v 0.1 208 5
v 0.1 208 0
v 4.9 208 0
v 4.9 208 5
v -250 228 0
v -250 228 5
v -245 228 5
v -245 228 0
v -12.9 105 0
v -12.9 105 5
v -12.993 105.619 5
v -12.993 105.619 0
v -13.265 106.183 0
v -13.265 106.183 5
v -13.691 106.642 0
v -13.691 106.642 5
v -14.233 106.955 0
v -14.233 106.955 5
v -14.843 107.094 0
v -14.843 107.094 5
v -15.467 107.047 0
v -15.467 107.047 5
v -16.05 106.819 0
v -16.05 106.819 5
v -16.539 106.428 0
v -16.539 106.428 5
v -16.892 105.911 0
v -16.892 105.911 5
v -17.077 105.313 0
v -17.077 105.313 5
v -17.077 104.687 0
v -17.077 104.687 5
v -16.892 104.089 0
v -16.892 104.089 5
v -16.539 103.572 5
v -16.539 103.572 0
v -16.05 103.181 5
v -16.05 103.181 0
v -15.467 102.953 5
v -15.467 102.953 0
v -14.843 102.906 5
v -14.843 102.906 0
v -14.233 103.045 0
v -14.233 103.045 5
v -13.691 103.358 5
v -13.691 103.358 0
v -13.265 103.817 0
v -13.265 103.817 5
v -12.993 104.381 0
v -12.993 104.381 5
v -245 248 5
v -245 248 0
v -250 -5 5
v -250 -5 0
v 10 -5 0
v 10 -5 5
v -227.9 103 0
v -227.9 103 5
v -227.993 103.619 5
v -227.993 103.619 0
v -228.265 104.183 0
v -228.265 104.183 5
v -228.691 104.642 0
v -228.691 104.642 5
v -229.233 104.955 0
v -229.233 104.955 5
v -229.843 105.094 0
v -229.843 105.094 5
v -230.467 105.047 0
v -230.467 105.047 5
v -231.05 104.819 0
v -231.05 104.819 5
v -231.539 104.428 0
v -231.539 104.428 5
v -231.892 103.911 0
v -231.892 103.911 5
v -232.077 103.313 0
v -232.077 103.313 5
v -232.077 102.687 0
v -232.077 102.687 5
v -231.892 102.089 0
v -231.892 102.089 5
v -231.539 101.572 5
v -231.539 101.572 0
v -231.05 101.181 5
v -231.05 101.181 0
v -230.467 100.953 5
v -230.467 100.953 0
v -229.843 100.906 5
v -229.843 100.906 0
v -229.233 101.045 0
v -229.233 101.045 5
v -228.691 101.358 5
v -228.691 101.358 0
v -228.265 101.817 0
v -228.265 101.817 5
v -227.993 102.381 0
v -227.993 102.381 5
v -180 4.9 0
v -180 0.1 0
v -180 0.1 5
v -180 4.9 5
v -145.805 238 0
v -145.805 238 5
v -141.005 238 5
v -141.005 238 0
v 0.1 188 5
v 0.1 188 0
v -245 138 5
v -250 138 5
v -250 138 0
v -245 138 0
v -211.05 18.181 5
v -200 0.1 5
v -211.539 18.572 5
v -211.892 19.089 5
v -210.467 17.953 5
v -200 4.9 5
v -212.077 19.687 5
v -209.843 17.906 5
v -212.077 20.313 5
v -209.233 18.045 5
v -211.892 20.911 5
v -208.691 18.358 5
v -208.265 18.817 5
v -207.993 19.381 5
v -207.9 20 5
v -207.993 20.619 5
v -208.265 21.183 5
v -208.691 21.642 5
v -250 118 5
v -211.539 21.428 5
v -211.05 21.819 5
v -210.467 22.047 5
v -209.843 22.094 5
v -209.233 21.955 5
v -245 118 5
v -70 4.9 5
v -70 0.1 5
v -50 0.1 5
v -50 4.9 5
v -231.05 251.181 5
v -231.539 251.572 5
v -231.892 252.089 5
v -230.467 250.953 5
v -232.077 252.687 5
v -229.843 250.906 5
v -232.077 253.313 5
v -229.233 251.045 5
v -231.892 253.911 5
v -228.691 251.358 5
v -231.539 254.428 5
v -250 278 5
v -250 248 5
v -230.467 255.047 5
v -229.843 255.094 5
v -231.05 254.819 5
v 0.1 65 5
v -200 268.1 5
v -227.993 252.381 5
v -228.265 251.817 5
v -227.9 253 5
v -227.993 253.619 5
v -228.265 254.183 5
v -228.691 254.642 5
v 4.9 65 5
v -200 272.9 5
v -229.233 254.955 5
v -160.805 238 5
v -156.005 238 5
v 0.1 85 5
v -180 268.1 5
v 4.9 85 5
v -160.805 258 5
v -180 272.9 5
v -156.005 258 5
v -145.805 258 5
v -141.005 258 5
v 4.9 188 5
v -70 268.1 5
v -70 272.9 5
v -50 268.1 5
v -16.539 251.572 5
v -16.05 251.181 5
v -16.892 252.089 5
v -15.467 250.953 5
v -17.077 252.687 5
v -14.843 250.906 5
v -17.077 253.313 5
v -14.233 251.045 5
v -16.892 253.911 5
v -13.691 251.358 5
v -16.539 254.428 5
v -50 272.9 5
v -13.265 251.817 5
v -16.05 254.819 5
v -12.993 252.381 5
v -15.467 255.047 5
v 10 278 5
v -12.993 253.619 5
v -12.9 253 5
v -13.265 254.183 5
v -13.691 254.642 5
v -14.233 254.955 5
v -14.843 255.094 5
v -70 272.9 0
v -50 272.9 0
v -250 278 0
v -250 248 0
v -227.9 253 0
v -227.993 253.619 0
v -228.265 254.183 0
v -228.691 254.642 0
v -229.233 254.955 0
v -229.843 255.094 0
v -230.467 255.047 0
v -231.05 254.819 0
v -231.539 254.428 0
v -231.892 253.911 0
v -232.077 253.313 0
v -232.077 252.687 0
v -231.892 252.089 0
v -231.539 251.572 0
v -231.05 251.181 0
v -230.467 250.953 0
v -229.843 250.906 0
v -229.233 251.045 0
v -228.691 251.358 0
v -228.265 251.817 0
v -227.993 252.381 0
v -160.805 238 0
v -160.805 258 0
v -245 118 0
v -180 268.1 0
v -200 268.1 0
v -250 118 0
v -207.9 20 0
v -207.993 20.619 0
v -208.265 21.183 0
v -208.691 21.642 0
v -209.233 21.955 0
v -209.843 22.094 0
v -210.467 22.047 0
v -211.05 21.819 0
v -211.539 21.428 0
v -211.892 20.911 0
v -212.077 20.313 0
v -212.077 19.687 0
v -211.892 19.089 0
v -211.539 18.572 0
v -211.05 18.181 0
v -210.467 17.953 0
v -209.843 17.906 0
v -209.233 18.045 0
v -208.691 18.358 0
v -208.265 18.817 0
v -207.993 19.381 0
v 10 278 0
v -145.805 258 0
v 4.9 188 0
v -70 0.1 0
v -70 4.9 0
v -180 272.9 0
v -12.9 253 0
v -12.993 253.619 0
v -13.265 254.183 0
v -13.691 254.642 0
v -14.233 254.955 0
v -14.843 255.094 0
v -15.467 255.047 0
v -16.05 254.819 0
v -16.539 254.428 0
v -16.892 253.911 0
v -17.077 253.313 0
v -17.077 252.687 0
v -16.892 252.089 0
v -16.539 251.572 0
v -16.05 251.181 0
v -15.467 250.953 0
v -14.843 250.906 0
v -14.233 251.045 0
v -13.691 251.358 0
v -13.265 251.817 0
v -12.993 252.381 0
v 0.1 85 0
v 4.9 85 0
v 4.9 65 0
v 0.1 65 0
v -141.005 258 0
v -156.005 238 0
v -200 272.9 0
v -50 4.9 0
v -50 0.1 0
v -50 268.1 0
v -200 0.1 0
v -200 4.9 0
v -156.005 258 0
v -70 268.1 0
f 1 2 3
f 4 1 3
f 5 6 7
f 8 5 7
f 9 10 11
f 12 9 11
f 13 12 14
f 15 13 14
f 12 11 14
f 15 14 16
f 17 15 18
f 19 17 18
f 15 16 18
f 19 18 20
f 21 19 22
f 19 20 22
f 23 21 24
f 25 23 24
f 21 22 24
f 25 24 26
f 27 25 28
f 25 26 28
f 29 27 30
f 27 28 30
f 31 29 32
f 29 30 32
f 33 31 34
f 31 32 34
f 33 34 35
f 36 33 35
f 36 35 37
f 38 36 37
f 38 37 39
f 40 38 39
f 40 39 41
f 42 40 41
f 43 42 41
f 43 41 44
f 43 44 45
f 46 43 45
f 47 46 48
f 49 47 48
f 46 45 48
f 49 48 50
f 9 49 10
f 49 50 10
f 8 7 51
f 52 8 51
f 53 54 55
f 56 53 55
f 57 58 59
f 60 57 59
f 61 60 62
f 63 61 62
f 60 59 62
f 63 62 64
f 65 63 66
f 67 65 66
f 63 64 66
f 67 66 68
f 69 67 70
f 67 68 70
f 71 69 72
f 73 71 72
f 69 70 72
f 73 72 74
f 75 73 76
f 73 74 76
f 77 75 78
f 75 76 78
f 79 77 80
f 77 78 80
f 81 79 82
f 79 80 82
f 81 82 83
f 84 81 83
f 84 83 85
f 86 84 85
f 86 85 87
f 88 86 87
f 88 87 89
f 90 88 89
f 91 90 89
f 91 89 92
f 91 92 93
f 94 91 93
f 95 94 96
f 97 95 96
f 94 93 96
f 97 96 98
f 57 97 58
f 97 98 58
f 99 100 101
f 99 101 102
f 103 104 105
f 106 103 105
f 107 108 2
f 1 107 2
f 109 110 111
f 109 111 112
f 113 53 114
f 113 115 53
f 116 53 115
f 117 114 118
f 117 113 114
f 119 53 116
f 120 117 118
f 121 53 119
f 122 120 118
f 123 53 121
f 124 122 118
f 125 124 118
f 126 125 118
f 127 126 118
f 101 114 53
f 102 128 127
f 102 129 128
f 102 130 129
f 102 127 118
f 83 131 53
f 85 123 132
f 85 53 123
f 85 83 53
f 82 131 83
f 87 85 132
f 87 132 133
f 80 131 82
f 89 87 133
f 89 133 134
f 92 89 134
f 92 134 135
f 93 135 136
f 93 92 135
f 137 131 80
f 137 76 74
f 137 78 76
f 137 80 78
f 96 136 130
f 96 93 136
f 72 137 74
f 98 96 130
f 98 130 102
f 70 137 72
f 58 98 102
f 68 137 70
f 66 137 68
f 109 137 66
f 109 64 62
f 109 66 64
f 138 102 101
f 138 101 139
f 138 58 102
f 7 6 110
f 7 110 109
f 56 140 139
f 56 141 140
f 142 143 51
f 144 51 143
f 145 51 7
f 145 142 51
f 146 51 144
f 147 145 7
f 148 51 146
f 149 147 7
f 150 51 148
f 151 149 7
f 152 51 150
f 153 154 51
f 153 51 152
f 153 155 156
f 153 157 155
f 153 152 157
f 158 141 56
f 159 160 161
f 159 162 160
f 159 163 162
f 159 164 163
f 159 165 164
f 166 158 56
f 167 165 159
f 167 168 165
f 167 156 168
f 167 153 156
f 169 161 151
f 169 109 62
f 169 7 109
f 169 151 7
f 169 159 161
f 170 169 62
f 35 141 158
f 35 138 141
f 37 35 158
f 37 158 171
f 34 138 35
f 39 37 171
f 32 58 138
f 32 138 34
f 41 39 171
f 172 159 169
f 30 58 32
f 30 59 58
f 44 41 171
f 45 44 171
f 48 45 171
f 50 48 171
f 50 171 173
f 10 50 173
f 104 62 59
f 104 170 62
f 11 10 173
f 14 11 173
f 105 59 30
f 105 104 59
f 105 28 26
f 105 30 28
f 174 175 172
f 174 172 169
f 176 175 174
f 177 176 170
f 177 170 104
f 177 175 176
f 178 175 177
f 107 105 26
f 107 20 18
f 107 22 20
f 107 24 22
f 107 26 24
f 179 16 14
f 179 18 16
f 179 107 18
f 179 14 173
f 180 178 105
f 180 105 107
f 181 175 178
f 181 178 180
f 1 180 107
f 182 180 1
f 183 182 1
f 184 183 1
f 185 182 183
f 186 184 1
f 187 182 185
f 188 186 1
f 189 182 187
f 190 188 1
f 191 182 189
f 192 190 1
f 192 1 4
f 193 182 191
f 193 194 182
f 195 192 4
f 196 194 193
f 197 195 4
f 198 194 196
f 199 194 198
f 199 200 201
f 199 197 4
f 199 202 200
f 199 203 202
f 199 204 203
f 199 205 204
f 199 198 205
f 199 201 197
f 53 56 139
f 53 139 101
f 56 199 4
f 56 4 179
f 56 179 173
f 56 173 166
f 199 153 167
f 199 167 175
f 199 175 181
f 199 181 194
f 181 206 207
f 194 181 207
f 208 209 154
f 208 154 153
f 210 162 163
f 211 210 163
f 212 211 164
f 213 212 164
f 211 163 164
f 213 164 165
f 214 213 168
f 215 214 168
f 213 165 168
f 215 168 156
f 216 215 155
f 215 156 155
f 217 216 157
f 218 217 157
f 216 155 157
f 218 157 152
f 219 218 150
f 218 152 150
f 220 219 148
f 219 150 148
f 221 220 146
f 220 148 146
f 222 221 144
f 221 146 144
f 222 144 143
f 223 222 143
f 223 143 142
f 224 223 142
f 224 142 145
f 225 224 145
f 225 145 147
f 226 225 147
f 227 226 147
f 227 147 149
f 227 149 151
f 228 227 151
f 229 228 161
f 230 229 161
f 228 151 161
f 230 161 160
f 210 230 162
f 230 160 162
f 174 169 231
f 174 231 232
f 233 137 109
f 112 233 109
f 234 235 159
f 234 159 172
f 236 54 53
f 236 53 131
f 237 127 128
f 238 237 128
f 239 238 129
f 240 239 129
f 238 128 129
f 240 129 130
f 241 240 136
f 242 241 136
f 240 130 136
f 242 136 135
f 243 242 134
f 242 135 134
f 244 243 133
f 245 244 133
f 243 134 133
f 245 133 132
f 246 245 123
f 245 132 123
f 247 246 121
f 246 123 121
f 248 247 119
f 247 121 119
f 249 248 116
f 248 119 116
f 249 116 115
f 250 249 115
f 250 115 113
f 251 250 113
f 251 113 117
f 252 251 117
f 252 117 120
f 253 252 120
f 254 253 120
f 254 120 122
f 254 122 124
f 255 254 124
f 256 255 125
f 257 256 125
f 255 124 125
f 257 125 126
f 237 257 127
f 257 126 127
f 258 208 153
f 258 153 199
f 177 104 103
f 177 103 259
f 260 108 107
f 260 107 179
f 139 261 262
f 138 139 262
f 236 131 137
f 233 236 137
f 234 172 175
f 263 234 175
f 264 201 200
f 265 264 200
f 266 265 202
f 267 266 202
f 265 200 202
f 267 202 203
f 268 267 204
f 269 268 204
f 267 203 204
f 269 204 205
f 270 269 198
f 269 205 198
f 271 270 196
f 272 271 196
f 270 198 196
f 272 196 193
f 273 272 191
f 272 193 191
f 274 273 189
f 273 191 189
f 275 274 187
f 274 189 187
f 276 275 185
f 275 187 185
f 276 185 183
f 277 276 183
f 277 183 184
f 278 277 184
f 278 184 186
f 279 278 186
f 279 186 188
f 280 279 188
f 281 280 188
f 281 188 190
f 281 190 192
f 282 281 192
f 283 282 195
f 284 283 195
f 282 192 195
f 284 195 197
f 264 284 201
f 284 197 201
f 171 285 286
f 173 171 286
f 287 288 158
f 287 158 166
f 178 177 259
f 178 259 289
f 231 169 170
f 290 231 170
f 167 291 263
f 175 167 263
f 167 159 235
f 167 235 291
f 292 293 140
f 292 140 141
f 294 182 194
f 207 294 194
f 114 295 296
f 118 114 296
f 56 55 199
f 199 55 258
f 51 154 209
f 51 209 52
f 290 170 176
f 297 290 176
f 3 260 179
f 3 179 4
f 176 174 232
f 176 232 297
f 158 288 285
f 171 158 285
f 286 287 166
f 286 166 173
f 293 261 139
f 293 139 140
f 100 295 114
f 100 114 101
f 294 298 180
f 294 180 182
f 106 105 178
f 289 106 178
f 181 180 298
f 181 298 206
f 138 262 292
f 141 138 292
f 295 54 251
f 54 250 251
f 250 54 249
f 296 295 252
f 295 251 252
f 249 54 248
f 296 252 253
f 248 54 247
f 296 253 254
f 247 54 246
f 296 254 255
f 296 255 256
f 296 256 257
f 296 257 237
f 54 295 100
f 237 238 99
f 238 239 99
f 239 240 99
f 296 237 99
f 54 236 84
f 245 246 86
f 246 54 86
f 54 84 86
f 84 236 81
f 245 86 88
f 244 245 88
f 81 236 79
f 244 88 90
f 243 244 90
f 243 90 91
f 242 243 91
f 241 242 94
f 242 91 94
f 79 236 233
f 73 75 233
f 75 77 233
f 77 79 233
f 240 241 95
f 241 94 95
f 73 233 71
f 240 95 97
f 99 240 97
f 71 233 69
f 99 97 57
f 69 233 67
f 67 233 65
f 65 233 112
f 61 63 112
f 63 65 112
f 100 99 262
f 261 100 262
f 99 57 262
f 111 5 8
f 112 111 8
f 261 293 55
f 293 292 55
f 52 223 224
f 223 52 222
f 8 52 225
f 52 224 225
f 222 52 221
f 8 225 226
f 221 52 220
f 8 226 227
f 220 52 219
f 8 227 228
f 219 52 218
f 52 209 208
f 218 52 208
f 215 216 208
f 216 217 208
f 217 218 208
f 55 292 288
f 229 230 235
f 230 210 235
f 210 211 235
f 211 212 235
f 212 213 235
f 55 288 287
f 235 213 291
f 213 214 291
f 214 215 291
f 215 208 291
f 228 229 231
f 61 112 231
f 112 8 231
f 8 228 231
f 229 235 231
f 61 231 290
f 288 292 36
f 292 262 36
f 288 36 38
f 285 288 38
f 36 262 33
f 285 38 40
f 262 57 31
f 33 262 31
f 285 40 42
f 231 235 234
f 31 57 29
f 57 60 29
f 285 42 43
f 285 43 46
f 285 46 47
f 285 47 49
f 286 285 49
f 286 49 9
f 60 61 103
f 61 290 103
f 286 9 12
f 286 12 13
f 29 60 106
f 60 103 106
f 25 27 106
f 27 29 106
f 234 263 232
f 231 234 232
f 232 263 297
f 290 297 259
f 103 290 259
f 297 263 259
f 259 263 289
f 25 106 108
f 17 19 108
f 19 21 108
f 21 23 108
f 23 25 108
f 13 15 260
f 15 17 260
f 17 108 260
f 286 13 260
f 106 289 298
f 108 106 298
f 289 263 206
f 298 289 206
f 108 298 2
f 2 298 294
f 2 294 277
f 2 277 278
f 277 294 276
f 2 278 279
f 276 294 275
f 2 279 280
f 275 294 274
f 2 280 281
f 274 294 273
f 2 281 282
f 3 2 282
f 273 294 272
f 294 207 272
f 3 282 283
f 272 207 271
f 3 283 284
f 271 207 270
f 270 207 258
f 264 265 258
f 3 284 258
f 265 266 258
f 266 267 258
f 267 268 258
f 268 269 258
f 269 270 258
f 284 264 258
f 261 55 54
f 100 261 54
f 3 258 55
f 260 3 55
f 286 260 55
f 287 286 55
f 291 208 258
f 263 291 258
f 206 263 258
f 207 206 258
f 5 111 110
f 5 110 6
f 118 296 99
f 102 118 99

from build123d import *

# Parameters (mm, degrees)
SKETCH1_W           = 260
SKETCH1_H           = 283
SKETCH1_W_2         = 20
SKETCH1_H_2         = 4.8
SKETCH1_W_3         = 4.8
SKETCH1_H_3         = 20
BOSS_EXTRUDE1_DEPTH = 5
SKETCH2_W           = 4.8
SKETCH2_H           = 20
CUT_EXTRUDE1_DEPTH  = 5
SKETCH3_R           = 2.1
CUT_EXTRUDE2_DEPTH  = 5
SKETCH4_R           = 2.1
CUT_EXTRUDE3_DEPTH  = 5
SKETCH5_R           = 2.1
CUT_EXTRUDE4_DEPTH  = 5
SKETCH6_R           = 2.1
CUT_EXTRUDE5_DEPTH  = 5
SKETCH7_W           = 5
SKETCH7_H           = 20
CUT_EXTRUDE6_DEPTH  = 10


with BuildPart() as part:
    # Sketch1 → Boss-Extrude1 (new body)
    with BuildSketch(Plane.XY):
        with Locations((-120, 136.5)):
            Rectangle(SKETCH1_W, SKETCH1_H)
        with Locations((-190, 2.5)):
            Rectangle(SKETCH1_W_2, SKETCH1_H_2, mode=Mode.SUBTRACT)
        with Locations((-60, 2.5)):
            Rectangle(SKETCH1_W_2, SKETCH1_H_2, mode=Mode.SUBTRACT)
        with Locations((2.5, 75)):
            Rectangle(SKETCH1_W_3, SKETCH1_H_3, mode=Mode.SUBTRACT)
        with Locations((2.5, 198)):
            Rectangle(SKETCH1_W_3, SKETCH1_H_3, mode=Mode.SUBTRACT)
        with Locations((-60, 270.5)):
            Rectangle(SKETCH1_W_2, SKETCH1_H_2, mode=Mode.SUBTRACT)
        with Locations((-190, 270.5)):
            Rectangle(SKETCH1_W_2, SKETCH1_H_2, mode=Mode.SUBTRACT)
    extrude(amount=BOSS_EXTRUDE1_DEPTH)

    # Sketch2 → Cut-Extrude1 (cut)
    with BuildSketch(Plane.XY.offset(5)):
        with Locations((-143.405234687, 248)):
            Rectangle(SKETCH2_W, SKETCH2_H)
        with Locations((-158.405234687, 248)):
            Rectangle(SKETCH2_W, SKETCH2_H)
    extrude(amount=-CUT_EXTRUDE1_DEPTH, mode=Mode.SUBTRACT)

    # Sketch3 → Cut-Extrude2 (cut)
    with BuildSketch(Plane.XY.offset(5)):
        with Locations((-230, 253)):
            Circle(SKETCH3_R)
        with Locations((-15, 253)):
            Circle(SKETCH3_R)
    extrude(amount=-CUT_EXTRUDE2_DEPTH, mode=Mode.SUBTRACT)

    # Sketch4 → Cut-Extrude3 (cut)
    with BuildSketch(Plane.XY.offset(5)):
        with Locations((-210, 20)):
            Circle(SKETCH4_R)
    extrude(amount=-CUT_EXTRUDE3_DEPTH, mode=Mode.SUBTRACT)

    # Sketch5 → Cut-Extrude4 (cut)
    with BuildSketch(Plane.XY.offset(5)):
        with Locations((-15, 105)):
            Circle(SKETCH5_R)
    extrude(amount=-CUT_EXTRUDE4_DEPTH, mode=Mode.SUBTRACT)

    # Sketch6 → Cut-Extrude5 (cut)
    with BuildSketch(Plane.XY.offset(5)):
        with Locations((-230, 103)):
            Circle(SKETCH6_R)
    extrude(amount=-CUT_EXTRUDE5_DEPTH, mode=Mode.SUBTRACT)

    # Sketch7 → Cut-Extrude6 (cut)
    with BuildSketch(Plane.XY.offset(5)):
        with Locations((-247.5, 238)):
            Rectangle(SKETCH7_W, SKETCH7_H)
        with Locations((-247.5, 128)):
            Rectangle(SKETCH7_W, SKETCH7_H)
    extrude(amount=-CUT_EXTRUDE6_DEPTH, mode=Mode.SUBTRACT)


solid = part.part
